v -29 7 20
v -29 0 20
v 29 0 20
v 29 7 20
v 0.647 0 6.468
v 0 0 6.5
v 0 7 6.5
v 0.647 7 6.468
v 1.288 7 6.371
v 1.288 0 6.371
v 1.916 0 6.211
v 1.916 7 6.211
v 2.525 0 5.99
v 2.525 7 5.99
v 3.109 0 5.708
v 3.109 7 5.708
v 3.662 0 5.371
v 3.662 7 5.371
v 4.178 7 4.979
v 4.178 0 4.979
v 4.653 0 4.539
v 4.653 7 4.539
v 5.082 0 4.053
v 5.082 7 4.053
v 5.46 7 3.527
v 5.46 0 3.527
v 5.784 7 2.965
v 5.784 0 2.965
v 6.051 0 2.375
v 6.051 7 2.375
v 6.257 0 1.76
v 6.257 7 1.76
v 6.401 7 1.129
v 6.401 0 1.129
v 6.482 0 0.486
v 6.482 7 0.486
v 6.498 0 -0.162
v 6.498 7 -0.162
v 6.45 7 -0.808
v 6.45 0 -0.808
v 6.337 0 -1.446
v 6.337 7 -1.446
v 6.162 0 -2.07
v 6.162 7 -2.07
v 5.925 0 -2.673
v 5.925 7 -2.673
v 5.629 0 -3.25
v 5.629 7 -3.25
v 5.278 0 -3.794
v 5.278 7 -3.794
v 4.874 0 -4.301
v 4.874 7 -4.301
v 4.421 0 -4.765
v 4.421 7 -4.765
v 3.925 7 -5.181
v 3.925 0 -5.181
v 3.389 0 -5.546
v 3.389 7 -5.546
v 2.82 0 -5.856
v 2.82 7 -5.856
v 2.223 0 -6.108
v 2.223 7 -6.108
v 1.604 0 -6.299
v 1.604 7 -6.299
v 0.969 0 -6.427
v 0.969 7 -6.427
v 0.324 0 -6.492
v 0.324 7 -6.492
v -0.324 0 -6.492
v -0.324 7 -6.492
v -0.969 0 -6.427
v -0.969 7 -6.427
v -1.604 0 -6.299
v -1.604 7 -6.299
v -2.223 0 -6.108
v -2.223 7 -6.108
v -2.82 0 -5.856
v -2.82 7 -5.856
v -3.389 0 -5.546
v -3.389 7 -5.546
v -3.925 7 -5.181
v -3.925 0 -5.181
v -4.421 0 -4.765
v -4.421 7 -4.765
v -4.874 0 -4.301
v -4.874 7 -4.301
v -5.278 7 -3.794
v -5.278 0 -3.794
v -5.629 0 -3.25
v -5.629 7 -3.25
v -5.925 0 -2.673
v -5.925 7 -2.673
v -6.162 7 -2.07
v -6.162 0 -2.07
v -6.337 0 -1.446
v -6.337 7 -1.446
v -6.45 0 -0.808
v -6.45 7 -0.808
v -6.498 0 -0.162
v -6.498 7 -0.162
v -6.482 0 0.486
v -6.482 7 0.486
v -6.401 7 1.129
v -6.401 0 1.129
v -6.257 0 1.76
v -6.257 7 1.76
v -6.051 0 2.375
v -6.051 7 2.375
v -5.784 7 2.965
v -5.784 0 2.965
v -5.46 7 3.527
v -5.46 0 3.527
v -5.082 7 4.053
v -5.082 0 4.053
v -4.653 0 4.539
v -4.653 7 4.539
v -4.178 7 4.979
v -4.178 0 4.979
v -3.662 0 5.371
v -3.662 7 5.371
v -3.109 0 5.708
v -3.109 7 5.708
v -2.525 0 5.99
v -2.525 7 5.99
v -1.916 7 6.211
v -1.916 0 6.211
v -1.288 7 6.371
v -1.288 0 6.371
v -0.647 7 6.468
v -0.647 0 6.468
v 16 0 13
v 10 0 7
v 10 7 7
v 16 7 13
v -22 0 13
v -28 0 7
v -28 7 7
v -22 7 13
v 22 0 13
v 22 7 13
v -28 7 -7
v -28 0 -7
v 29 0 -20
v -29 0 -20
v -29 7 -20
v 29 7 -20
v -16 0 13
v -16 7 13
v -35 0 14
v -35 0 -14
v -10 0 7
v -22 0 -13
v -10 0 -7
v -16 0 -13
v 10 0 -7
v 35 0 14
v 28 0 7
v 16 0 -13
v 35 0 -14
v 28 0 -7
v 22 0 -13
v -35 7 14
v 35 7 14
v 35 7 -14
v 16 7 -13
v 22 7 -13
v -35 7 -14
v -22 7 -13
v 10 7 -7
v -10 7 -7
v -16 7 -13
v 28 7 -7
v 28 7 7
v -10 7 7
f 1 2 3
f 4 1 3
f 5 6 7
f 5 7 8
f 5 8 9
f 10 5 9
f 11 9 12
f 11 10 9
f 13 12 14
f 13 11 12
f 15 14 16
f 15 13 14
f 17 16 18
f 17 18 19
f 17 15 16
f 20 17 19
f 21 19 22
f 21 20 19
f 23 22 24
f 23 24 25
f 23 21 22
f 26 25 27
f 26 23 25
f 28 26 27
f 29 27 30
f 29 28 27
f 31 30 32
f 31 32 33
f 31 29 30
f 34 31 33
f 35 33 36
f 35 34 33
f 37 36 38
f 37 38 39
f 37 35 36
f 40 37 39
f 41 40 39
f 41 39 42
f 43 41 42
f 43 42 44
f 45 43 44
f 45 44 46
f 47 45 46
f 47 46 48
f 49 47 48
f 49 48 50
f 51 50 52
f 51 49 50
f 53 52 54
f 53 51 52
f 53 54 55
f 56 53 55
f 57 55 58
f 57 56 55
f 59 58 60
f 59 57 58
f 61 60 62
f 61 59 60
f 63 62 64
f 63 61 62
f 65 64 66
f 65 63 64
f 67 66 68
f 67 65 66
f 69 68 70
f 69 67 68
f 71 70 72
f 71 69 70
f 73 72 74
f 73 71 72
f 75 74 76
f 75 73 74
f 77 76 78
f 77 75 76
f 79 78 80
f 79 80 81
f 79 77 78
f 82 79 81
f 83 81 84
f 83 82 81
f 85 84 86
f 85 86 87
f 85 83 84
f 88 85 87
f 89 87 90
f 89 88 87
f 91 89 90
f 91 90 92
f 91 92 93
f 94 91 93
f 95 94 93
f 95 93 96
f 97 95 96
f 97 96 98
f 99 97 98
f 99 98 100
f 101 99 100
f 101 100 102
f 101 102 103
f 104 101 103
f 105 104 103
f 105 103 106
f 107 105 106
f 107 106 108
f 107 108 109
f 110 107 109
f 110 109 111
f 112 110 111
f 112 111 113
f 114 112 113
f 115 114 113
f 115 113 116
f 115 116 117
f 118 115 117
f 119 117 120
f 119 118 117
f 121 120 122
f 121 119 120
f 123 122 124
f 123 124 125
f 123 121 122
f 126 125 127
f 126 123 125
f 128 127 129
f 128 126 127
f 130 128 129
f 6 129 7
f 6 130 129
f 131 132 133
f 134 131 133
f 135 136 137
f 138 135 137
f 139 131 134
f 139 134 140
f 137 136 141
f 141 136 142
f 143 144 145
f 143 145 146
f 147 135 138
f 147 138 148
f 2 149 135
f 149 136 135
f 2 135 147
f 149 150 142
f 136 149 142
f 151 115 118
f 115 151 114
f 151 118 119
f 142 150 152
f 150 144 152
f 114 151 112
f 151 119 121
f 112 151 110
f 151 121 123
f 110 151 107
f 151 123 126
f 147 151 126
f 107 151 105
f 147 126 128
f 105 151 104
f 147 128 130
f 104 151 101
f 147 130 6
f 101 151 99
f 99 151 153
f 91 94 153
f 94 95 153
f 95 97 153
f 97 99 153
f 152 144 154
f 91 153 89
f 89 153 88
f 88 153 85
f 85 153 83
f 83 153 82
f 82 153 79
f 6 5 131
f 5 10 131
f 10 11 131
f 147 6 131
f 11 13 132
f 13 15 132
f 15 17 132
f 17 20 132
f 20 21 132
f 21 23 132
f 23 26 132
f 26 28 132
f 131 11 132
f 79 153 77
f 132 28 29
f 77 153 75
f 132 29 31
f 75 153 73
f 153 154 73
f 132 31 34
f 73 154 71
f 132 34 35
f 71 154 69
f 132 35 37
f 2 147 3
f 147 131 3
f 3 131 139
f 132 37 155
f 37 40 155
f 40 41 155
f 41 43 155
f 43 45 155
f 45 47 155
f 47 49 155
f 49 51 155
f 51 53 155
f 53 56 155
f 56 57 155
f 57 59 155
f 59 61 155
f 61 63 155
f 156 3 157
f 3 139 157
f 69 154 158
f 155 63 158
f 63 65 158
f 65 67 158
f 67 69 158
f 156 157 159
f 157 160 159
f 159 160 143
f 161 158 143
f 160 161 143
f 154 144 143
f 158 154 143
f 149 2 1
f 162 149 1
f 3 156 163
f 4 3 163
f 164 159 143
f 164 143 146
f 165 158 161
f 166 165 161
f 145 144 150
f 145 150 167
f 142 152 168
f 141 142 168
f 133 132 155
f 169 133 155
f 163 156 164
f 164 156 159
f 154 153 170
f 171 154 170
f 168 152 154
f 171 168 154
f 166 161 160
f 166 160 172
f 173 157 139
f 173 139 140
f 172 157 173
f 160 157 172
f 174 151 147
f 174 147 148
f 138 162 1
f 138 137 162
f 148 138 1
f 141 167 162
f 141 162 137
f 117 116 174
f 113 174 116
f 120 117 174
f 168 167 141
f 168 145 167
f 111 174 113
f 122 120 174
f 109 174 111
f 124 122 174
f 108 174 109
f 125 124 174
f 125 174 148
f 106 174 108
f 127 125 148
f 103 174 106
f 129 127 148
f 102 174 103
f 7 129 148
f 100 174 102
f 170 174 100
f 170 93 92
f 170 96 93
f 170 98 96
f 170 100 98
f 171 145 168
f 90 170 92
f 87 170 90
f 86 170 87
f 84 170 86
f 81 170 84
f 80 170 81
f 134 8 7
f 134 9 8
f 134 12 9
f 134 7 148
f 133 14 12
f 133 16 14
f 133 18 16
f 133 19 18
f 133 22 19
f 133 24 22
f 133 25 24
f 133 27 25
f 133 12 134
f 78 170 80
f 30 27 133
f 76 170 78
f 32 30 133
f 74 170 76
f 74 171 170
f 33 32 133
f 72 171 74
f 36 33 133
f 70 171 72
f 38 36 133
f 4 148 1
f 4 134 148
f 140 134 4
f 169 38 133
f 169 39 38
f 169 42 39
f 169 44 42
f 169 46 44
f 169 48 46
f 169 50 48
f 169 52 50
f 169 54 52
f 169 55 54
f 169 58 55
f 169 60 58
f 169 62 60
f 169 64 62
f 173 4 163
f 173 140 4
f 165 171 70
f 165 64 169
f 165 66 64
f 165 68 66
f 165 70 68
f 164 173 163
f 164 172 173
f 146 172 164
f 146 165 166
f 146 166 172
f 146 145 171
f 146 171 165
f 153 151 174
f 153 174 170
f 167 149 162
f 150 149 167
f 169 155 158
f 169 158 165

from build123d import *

# Parameters (mm, degrees)
SKETCH1_W           = 70
SKETCH1_H           = 40
SKETCH1_R           = 6.5
SKETCH1_W_2         = 18
SKETCH1_H_2         = 26
BOSS_EXTRUDE1_DEPTH = 7
CHAMFER1_SIZE       = 6


with BuildPart() as part:
    # Sketch1 → Boss-Extrude1 (new body)
    with BuildSketch(Plane(origin=(0, 0, 0), x_dir=(1, 0, 0), z_dir=(0, 1, 0))):
        Rectangle(SKETCH1_W, SKETCH1_H)
        with Locations(Location((0, 0, 0), (0, 0, 270))):
            Circle(SKETCH1_R, mode=Mode.SUBTRACT)
        with Locations((-19, 0)):
            Rectangle(SKETCH1_W_2, SKETCH1_H_2, mode=Mode.SUBTRACT)
        with Locations((19, 0)):
            Rectangle(SKETCH1_W_2, SKETCH1_H_2, mode=Mode.SUBTRACT)
    extrude(amount=BOSS_EXTRUDE1_DEPTH)

    # Chamfer1
    chamfer1_edges = [part.edges().sort_by_distance(p)[0] for p in [
        (-10, 3.5, 13),
        (-10, 3.5, -13),
        (-28, 3.5, -13),
        (-28, 3.5, 13),
        (28, 3.5, 13),
        (28, 3.5, -13),
        (10, 3.5, -13),
        (10, 3.5, 13),
        (35, 3.5, 20),
        (-35, 3.5, 20),
        (-35, 3.5, -20),
        (35, 3.5, -20),
    ]]
    chamfer(chamfer1_edges, length=CHAMFER1_SIZE)


solid = part.part
